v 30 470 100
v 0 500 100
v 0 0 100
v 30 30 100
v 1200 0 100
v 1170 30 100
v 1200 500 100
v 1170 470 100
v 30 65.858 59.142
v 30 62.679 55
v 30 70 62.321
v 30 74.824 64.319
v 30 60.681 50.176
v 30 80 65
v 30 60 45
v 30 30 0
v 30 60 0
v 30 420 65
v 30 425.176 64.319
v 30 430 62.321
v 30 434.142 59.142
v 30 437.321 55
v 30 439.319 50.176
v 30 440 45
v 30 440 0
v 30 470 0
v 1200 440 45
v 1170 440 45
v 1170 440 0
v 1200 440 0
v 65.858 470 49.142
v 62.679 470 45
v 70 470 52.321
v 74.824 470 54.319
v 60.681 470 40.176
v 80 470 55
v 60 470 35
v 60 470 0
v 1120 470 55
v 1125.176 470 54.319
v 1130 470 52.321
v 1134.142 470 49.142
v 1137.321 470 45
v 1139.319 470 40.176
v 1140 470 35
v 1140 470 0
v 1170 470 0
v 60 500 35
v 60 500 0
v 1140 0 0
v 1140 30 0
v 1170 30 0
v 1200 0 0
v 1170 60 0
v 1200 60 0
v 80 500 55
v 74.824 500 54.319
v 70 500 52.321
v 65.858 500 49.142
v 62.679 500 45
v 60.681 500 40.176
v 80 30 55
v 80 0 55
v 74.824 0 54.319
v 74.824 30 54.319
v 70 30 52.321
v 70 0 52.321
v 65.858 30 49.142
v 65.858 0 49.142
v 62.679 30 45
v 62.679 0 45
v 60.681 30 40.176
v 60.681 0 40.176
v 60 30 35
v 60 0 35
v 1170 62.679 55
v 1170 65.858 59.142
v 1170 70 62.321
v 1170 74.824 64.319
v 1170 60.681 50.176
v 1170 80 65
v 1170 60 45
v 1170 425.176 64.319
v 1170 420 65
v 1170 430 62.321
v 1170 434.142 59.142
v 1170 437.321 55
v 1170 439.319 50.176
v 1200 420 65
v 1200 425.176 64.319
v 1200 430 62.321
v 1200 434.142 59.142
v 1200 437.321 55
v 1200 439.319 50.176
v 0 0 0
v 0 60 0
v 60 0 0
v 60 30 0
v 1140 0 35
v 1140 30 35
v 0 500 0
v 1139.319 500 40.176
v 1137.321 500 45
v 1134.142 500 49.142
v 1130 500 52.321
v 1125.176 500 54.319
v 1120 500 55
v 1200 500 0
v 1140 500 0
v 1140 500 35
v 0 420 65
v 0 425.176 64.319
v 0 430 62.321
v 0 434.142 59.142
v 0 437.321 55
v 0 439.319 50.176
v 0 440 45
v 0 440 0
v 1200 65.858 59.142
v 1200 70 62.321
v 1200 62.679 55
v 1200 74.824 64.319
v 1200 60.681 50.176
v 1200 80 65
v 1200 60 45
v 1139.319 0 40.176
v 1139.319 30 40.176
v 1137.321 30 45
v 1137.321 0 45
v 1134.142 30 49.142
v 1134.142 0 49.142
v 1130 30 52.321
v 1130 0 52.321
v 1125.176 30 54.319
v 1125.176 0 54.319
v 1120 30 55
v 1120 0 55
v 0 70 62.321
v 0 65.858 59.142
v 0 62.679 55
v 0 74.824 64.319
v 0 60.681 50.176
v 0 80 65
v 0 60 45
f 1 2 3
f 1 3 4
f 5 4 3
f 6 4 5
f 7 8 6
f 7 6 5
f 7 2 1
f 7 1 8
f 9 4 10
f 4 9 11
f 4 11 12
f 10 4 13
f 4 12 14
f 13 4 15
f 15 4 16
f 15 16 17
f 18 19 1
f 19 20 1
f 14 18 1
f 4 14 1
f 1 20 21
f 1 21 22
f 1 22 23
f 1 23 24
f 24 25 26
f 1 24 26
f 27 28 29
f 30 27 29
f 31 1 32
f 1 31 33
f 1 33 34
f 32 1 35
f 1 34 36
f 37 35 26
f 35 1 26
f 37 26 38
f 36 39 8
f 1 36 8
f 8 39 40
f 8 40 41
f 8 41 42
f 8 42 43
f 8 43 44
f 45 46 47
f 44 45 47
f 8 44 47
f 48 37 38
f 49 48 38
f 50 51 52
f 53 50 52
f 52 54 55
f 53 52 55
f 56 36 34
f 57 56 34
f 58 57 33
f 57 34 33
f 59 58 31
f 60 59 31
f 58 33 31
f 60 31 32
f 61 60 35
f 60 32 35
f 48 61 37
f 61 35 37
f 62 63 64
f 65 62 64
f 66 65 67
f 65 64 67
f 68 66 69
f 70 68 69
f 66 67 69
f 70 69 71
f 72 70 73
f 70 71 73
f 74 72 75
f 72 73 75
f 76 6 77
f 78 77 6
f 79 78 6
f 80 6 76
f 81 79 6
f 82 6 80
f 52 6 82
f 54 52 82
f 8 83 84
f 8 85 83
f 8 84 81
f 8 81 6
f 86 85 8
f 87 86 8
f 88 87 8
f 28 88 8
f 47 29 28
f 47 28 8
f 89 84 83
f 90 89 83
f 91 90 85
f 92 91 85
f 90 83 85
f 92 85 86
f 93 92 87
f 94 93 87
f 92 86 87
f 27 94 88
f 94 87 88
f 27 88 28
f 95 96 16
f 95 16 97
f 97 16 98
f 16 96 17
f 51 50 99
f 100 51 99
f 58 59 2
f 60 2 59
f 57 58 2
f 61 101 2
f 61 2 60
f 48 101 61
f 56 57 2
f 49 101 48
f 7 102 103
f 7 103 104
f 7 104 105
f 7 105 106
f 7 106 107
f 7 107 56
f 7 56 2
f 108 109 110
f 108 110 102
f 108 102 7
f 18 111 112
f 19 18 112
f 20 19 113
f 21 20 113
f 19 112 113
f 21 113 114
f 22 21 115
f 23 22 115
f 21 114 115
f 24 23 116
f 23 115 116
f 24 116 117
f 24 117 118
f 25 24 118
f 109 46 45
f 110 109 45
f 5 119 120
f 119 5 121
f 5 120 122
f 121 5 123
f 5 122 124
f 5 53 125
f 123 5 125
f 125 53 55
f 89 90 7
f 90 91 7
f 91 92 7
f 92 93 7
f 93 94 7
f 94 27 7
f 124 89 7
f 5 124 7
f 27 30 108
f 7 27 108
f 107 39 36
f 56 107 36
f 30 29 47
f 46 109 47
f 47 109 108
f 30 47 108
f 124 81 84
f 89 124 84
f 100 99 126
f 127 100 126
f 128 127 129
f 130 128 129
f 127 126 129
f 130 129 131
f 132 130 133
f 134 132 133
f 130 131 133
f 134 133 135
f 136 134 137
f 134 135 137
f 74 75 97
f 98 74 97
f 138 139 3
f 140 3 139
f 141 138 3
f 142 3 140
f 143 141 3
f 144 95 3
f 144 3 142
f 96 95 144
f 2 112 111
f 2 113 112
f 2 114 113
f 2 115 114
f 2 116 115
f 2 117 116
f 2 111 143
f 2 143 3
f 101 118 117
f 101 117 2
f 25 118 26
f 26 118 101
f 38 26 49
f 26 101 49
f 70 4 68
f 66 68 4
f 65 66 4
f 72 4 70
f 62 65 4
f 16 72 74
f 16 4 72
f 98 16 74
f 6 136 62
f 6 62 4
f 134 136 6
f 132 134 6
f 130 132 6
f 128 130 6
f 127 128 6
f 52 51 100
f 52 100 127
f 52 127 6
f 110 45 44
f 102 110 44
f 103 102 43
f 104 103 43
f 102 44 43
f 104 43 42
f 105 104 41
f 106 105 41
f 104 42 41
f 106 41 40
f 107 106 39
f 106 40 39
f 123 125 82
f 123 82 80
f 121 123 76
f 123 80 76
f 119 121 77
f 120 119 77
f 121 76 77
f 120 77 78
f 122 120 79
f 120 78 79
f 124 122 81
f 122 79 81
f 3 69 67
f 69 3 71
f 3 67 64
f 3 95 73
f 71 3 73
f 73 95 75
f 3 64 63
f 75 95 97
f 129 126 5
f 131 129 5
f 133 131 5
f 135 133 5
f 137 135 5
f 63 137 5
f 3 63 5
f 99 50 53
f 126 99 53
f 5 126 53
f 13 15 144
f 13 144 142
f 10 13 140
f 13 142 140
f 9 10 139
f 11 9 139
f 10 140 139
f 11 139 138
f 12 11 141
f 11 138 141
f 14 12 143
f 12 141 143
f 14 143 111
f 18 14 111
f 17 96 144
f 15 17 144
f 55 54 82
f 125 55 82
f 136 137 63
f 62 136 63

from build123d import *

# Parameters (mm, degrees)
F0_W     = 1200
F0_H     = 500
F0_W_2   = 1140
F0_H_2   = 440
F1_DEPTH = 100
F3_DEPTH = 500.001
F5_DEPTH = 1200.001


with BuildPart() as f1:
    # F0 (on Top) → F1 (new body)
    with BuildSketch(Plane.XY):
        with Locations((600, 250)):
            Rectangle(F0_W, F0_H)
        with Locations((600, 250)):
            Rectangle(F0_W_2, F0_H_2, mode=Mode.SUBTRACT)
    extrude(amount=F1_DEPTH)

    # F2 (on face) → F3 (cut, through all)
    with BuildSketch(Plane.XZ):
        with BuildLine():
            Line((60, 35), (60, 0))
            Line((60, 0), (1140, 0))
            Line((1140, 0), (1140, 35))
            ThreePointArc((1140, 35), (1134.142136, 49.142136), (1120, 55))
            Line((1120, 55), (80, 55))
            ThreePointArc((80, 55), (65.857864, 49.142136), (60, 35))
        make_face()
    extrude(amount=-F3_DEPTH, mode=Mode.SUBTRACT)

    # F4 (on face) → F5 (cut, through all)
    with BuildSketch(Plane(origin=(0, 0, 0), x_dir=(0, -1, 0), z_dir=(-1, 0, 0))):
        with BuildLine():
            Line((-440, 45), (-440, 0))
            Line((-440, 0), (-60, 0))
            Line((-60, 0), (-60, 45))
            ThreePointArc((-60, 45), (-65.857864, 59.142136), (-80, 65))
            Line((-80, 65), (-420, 65))
            ThreePointArc((-420, 65), (-434.142136, 59.142136), (-440, 45))
        make_face()
    extrude(amount=-F5_DEPTH, mode=Mode.SUBTRACT)


solid = f1.part
